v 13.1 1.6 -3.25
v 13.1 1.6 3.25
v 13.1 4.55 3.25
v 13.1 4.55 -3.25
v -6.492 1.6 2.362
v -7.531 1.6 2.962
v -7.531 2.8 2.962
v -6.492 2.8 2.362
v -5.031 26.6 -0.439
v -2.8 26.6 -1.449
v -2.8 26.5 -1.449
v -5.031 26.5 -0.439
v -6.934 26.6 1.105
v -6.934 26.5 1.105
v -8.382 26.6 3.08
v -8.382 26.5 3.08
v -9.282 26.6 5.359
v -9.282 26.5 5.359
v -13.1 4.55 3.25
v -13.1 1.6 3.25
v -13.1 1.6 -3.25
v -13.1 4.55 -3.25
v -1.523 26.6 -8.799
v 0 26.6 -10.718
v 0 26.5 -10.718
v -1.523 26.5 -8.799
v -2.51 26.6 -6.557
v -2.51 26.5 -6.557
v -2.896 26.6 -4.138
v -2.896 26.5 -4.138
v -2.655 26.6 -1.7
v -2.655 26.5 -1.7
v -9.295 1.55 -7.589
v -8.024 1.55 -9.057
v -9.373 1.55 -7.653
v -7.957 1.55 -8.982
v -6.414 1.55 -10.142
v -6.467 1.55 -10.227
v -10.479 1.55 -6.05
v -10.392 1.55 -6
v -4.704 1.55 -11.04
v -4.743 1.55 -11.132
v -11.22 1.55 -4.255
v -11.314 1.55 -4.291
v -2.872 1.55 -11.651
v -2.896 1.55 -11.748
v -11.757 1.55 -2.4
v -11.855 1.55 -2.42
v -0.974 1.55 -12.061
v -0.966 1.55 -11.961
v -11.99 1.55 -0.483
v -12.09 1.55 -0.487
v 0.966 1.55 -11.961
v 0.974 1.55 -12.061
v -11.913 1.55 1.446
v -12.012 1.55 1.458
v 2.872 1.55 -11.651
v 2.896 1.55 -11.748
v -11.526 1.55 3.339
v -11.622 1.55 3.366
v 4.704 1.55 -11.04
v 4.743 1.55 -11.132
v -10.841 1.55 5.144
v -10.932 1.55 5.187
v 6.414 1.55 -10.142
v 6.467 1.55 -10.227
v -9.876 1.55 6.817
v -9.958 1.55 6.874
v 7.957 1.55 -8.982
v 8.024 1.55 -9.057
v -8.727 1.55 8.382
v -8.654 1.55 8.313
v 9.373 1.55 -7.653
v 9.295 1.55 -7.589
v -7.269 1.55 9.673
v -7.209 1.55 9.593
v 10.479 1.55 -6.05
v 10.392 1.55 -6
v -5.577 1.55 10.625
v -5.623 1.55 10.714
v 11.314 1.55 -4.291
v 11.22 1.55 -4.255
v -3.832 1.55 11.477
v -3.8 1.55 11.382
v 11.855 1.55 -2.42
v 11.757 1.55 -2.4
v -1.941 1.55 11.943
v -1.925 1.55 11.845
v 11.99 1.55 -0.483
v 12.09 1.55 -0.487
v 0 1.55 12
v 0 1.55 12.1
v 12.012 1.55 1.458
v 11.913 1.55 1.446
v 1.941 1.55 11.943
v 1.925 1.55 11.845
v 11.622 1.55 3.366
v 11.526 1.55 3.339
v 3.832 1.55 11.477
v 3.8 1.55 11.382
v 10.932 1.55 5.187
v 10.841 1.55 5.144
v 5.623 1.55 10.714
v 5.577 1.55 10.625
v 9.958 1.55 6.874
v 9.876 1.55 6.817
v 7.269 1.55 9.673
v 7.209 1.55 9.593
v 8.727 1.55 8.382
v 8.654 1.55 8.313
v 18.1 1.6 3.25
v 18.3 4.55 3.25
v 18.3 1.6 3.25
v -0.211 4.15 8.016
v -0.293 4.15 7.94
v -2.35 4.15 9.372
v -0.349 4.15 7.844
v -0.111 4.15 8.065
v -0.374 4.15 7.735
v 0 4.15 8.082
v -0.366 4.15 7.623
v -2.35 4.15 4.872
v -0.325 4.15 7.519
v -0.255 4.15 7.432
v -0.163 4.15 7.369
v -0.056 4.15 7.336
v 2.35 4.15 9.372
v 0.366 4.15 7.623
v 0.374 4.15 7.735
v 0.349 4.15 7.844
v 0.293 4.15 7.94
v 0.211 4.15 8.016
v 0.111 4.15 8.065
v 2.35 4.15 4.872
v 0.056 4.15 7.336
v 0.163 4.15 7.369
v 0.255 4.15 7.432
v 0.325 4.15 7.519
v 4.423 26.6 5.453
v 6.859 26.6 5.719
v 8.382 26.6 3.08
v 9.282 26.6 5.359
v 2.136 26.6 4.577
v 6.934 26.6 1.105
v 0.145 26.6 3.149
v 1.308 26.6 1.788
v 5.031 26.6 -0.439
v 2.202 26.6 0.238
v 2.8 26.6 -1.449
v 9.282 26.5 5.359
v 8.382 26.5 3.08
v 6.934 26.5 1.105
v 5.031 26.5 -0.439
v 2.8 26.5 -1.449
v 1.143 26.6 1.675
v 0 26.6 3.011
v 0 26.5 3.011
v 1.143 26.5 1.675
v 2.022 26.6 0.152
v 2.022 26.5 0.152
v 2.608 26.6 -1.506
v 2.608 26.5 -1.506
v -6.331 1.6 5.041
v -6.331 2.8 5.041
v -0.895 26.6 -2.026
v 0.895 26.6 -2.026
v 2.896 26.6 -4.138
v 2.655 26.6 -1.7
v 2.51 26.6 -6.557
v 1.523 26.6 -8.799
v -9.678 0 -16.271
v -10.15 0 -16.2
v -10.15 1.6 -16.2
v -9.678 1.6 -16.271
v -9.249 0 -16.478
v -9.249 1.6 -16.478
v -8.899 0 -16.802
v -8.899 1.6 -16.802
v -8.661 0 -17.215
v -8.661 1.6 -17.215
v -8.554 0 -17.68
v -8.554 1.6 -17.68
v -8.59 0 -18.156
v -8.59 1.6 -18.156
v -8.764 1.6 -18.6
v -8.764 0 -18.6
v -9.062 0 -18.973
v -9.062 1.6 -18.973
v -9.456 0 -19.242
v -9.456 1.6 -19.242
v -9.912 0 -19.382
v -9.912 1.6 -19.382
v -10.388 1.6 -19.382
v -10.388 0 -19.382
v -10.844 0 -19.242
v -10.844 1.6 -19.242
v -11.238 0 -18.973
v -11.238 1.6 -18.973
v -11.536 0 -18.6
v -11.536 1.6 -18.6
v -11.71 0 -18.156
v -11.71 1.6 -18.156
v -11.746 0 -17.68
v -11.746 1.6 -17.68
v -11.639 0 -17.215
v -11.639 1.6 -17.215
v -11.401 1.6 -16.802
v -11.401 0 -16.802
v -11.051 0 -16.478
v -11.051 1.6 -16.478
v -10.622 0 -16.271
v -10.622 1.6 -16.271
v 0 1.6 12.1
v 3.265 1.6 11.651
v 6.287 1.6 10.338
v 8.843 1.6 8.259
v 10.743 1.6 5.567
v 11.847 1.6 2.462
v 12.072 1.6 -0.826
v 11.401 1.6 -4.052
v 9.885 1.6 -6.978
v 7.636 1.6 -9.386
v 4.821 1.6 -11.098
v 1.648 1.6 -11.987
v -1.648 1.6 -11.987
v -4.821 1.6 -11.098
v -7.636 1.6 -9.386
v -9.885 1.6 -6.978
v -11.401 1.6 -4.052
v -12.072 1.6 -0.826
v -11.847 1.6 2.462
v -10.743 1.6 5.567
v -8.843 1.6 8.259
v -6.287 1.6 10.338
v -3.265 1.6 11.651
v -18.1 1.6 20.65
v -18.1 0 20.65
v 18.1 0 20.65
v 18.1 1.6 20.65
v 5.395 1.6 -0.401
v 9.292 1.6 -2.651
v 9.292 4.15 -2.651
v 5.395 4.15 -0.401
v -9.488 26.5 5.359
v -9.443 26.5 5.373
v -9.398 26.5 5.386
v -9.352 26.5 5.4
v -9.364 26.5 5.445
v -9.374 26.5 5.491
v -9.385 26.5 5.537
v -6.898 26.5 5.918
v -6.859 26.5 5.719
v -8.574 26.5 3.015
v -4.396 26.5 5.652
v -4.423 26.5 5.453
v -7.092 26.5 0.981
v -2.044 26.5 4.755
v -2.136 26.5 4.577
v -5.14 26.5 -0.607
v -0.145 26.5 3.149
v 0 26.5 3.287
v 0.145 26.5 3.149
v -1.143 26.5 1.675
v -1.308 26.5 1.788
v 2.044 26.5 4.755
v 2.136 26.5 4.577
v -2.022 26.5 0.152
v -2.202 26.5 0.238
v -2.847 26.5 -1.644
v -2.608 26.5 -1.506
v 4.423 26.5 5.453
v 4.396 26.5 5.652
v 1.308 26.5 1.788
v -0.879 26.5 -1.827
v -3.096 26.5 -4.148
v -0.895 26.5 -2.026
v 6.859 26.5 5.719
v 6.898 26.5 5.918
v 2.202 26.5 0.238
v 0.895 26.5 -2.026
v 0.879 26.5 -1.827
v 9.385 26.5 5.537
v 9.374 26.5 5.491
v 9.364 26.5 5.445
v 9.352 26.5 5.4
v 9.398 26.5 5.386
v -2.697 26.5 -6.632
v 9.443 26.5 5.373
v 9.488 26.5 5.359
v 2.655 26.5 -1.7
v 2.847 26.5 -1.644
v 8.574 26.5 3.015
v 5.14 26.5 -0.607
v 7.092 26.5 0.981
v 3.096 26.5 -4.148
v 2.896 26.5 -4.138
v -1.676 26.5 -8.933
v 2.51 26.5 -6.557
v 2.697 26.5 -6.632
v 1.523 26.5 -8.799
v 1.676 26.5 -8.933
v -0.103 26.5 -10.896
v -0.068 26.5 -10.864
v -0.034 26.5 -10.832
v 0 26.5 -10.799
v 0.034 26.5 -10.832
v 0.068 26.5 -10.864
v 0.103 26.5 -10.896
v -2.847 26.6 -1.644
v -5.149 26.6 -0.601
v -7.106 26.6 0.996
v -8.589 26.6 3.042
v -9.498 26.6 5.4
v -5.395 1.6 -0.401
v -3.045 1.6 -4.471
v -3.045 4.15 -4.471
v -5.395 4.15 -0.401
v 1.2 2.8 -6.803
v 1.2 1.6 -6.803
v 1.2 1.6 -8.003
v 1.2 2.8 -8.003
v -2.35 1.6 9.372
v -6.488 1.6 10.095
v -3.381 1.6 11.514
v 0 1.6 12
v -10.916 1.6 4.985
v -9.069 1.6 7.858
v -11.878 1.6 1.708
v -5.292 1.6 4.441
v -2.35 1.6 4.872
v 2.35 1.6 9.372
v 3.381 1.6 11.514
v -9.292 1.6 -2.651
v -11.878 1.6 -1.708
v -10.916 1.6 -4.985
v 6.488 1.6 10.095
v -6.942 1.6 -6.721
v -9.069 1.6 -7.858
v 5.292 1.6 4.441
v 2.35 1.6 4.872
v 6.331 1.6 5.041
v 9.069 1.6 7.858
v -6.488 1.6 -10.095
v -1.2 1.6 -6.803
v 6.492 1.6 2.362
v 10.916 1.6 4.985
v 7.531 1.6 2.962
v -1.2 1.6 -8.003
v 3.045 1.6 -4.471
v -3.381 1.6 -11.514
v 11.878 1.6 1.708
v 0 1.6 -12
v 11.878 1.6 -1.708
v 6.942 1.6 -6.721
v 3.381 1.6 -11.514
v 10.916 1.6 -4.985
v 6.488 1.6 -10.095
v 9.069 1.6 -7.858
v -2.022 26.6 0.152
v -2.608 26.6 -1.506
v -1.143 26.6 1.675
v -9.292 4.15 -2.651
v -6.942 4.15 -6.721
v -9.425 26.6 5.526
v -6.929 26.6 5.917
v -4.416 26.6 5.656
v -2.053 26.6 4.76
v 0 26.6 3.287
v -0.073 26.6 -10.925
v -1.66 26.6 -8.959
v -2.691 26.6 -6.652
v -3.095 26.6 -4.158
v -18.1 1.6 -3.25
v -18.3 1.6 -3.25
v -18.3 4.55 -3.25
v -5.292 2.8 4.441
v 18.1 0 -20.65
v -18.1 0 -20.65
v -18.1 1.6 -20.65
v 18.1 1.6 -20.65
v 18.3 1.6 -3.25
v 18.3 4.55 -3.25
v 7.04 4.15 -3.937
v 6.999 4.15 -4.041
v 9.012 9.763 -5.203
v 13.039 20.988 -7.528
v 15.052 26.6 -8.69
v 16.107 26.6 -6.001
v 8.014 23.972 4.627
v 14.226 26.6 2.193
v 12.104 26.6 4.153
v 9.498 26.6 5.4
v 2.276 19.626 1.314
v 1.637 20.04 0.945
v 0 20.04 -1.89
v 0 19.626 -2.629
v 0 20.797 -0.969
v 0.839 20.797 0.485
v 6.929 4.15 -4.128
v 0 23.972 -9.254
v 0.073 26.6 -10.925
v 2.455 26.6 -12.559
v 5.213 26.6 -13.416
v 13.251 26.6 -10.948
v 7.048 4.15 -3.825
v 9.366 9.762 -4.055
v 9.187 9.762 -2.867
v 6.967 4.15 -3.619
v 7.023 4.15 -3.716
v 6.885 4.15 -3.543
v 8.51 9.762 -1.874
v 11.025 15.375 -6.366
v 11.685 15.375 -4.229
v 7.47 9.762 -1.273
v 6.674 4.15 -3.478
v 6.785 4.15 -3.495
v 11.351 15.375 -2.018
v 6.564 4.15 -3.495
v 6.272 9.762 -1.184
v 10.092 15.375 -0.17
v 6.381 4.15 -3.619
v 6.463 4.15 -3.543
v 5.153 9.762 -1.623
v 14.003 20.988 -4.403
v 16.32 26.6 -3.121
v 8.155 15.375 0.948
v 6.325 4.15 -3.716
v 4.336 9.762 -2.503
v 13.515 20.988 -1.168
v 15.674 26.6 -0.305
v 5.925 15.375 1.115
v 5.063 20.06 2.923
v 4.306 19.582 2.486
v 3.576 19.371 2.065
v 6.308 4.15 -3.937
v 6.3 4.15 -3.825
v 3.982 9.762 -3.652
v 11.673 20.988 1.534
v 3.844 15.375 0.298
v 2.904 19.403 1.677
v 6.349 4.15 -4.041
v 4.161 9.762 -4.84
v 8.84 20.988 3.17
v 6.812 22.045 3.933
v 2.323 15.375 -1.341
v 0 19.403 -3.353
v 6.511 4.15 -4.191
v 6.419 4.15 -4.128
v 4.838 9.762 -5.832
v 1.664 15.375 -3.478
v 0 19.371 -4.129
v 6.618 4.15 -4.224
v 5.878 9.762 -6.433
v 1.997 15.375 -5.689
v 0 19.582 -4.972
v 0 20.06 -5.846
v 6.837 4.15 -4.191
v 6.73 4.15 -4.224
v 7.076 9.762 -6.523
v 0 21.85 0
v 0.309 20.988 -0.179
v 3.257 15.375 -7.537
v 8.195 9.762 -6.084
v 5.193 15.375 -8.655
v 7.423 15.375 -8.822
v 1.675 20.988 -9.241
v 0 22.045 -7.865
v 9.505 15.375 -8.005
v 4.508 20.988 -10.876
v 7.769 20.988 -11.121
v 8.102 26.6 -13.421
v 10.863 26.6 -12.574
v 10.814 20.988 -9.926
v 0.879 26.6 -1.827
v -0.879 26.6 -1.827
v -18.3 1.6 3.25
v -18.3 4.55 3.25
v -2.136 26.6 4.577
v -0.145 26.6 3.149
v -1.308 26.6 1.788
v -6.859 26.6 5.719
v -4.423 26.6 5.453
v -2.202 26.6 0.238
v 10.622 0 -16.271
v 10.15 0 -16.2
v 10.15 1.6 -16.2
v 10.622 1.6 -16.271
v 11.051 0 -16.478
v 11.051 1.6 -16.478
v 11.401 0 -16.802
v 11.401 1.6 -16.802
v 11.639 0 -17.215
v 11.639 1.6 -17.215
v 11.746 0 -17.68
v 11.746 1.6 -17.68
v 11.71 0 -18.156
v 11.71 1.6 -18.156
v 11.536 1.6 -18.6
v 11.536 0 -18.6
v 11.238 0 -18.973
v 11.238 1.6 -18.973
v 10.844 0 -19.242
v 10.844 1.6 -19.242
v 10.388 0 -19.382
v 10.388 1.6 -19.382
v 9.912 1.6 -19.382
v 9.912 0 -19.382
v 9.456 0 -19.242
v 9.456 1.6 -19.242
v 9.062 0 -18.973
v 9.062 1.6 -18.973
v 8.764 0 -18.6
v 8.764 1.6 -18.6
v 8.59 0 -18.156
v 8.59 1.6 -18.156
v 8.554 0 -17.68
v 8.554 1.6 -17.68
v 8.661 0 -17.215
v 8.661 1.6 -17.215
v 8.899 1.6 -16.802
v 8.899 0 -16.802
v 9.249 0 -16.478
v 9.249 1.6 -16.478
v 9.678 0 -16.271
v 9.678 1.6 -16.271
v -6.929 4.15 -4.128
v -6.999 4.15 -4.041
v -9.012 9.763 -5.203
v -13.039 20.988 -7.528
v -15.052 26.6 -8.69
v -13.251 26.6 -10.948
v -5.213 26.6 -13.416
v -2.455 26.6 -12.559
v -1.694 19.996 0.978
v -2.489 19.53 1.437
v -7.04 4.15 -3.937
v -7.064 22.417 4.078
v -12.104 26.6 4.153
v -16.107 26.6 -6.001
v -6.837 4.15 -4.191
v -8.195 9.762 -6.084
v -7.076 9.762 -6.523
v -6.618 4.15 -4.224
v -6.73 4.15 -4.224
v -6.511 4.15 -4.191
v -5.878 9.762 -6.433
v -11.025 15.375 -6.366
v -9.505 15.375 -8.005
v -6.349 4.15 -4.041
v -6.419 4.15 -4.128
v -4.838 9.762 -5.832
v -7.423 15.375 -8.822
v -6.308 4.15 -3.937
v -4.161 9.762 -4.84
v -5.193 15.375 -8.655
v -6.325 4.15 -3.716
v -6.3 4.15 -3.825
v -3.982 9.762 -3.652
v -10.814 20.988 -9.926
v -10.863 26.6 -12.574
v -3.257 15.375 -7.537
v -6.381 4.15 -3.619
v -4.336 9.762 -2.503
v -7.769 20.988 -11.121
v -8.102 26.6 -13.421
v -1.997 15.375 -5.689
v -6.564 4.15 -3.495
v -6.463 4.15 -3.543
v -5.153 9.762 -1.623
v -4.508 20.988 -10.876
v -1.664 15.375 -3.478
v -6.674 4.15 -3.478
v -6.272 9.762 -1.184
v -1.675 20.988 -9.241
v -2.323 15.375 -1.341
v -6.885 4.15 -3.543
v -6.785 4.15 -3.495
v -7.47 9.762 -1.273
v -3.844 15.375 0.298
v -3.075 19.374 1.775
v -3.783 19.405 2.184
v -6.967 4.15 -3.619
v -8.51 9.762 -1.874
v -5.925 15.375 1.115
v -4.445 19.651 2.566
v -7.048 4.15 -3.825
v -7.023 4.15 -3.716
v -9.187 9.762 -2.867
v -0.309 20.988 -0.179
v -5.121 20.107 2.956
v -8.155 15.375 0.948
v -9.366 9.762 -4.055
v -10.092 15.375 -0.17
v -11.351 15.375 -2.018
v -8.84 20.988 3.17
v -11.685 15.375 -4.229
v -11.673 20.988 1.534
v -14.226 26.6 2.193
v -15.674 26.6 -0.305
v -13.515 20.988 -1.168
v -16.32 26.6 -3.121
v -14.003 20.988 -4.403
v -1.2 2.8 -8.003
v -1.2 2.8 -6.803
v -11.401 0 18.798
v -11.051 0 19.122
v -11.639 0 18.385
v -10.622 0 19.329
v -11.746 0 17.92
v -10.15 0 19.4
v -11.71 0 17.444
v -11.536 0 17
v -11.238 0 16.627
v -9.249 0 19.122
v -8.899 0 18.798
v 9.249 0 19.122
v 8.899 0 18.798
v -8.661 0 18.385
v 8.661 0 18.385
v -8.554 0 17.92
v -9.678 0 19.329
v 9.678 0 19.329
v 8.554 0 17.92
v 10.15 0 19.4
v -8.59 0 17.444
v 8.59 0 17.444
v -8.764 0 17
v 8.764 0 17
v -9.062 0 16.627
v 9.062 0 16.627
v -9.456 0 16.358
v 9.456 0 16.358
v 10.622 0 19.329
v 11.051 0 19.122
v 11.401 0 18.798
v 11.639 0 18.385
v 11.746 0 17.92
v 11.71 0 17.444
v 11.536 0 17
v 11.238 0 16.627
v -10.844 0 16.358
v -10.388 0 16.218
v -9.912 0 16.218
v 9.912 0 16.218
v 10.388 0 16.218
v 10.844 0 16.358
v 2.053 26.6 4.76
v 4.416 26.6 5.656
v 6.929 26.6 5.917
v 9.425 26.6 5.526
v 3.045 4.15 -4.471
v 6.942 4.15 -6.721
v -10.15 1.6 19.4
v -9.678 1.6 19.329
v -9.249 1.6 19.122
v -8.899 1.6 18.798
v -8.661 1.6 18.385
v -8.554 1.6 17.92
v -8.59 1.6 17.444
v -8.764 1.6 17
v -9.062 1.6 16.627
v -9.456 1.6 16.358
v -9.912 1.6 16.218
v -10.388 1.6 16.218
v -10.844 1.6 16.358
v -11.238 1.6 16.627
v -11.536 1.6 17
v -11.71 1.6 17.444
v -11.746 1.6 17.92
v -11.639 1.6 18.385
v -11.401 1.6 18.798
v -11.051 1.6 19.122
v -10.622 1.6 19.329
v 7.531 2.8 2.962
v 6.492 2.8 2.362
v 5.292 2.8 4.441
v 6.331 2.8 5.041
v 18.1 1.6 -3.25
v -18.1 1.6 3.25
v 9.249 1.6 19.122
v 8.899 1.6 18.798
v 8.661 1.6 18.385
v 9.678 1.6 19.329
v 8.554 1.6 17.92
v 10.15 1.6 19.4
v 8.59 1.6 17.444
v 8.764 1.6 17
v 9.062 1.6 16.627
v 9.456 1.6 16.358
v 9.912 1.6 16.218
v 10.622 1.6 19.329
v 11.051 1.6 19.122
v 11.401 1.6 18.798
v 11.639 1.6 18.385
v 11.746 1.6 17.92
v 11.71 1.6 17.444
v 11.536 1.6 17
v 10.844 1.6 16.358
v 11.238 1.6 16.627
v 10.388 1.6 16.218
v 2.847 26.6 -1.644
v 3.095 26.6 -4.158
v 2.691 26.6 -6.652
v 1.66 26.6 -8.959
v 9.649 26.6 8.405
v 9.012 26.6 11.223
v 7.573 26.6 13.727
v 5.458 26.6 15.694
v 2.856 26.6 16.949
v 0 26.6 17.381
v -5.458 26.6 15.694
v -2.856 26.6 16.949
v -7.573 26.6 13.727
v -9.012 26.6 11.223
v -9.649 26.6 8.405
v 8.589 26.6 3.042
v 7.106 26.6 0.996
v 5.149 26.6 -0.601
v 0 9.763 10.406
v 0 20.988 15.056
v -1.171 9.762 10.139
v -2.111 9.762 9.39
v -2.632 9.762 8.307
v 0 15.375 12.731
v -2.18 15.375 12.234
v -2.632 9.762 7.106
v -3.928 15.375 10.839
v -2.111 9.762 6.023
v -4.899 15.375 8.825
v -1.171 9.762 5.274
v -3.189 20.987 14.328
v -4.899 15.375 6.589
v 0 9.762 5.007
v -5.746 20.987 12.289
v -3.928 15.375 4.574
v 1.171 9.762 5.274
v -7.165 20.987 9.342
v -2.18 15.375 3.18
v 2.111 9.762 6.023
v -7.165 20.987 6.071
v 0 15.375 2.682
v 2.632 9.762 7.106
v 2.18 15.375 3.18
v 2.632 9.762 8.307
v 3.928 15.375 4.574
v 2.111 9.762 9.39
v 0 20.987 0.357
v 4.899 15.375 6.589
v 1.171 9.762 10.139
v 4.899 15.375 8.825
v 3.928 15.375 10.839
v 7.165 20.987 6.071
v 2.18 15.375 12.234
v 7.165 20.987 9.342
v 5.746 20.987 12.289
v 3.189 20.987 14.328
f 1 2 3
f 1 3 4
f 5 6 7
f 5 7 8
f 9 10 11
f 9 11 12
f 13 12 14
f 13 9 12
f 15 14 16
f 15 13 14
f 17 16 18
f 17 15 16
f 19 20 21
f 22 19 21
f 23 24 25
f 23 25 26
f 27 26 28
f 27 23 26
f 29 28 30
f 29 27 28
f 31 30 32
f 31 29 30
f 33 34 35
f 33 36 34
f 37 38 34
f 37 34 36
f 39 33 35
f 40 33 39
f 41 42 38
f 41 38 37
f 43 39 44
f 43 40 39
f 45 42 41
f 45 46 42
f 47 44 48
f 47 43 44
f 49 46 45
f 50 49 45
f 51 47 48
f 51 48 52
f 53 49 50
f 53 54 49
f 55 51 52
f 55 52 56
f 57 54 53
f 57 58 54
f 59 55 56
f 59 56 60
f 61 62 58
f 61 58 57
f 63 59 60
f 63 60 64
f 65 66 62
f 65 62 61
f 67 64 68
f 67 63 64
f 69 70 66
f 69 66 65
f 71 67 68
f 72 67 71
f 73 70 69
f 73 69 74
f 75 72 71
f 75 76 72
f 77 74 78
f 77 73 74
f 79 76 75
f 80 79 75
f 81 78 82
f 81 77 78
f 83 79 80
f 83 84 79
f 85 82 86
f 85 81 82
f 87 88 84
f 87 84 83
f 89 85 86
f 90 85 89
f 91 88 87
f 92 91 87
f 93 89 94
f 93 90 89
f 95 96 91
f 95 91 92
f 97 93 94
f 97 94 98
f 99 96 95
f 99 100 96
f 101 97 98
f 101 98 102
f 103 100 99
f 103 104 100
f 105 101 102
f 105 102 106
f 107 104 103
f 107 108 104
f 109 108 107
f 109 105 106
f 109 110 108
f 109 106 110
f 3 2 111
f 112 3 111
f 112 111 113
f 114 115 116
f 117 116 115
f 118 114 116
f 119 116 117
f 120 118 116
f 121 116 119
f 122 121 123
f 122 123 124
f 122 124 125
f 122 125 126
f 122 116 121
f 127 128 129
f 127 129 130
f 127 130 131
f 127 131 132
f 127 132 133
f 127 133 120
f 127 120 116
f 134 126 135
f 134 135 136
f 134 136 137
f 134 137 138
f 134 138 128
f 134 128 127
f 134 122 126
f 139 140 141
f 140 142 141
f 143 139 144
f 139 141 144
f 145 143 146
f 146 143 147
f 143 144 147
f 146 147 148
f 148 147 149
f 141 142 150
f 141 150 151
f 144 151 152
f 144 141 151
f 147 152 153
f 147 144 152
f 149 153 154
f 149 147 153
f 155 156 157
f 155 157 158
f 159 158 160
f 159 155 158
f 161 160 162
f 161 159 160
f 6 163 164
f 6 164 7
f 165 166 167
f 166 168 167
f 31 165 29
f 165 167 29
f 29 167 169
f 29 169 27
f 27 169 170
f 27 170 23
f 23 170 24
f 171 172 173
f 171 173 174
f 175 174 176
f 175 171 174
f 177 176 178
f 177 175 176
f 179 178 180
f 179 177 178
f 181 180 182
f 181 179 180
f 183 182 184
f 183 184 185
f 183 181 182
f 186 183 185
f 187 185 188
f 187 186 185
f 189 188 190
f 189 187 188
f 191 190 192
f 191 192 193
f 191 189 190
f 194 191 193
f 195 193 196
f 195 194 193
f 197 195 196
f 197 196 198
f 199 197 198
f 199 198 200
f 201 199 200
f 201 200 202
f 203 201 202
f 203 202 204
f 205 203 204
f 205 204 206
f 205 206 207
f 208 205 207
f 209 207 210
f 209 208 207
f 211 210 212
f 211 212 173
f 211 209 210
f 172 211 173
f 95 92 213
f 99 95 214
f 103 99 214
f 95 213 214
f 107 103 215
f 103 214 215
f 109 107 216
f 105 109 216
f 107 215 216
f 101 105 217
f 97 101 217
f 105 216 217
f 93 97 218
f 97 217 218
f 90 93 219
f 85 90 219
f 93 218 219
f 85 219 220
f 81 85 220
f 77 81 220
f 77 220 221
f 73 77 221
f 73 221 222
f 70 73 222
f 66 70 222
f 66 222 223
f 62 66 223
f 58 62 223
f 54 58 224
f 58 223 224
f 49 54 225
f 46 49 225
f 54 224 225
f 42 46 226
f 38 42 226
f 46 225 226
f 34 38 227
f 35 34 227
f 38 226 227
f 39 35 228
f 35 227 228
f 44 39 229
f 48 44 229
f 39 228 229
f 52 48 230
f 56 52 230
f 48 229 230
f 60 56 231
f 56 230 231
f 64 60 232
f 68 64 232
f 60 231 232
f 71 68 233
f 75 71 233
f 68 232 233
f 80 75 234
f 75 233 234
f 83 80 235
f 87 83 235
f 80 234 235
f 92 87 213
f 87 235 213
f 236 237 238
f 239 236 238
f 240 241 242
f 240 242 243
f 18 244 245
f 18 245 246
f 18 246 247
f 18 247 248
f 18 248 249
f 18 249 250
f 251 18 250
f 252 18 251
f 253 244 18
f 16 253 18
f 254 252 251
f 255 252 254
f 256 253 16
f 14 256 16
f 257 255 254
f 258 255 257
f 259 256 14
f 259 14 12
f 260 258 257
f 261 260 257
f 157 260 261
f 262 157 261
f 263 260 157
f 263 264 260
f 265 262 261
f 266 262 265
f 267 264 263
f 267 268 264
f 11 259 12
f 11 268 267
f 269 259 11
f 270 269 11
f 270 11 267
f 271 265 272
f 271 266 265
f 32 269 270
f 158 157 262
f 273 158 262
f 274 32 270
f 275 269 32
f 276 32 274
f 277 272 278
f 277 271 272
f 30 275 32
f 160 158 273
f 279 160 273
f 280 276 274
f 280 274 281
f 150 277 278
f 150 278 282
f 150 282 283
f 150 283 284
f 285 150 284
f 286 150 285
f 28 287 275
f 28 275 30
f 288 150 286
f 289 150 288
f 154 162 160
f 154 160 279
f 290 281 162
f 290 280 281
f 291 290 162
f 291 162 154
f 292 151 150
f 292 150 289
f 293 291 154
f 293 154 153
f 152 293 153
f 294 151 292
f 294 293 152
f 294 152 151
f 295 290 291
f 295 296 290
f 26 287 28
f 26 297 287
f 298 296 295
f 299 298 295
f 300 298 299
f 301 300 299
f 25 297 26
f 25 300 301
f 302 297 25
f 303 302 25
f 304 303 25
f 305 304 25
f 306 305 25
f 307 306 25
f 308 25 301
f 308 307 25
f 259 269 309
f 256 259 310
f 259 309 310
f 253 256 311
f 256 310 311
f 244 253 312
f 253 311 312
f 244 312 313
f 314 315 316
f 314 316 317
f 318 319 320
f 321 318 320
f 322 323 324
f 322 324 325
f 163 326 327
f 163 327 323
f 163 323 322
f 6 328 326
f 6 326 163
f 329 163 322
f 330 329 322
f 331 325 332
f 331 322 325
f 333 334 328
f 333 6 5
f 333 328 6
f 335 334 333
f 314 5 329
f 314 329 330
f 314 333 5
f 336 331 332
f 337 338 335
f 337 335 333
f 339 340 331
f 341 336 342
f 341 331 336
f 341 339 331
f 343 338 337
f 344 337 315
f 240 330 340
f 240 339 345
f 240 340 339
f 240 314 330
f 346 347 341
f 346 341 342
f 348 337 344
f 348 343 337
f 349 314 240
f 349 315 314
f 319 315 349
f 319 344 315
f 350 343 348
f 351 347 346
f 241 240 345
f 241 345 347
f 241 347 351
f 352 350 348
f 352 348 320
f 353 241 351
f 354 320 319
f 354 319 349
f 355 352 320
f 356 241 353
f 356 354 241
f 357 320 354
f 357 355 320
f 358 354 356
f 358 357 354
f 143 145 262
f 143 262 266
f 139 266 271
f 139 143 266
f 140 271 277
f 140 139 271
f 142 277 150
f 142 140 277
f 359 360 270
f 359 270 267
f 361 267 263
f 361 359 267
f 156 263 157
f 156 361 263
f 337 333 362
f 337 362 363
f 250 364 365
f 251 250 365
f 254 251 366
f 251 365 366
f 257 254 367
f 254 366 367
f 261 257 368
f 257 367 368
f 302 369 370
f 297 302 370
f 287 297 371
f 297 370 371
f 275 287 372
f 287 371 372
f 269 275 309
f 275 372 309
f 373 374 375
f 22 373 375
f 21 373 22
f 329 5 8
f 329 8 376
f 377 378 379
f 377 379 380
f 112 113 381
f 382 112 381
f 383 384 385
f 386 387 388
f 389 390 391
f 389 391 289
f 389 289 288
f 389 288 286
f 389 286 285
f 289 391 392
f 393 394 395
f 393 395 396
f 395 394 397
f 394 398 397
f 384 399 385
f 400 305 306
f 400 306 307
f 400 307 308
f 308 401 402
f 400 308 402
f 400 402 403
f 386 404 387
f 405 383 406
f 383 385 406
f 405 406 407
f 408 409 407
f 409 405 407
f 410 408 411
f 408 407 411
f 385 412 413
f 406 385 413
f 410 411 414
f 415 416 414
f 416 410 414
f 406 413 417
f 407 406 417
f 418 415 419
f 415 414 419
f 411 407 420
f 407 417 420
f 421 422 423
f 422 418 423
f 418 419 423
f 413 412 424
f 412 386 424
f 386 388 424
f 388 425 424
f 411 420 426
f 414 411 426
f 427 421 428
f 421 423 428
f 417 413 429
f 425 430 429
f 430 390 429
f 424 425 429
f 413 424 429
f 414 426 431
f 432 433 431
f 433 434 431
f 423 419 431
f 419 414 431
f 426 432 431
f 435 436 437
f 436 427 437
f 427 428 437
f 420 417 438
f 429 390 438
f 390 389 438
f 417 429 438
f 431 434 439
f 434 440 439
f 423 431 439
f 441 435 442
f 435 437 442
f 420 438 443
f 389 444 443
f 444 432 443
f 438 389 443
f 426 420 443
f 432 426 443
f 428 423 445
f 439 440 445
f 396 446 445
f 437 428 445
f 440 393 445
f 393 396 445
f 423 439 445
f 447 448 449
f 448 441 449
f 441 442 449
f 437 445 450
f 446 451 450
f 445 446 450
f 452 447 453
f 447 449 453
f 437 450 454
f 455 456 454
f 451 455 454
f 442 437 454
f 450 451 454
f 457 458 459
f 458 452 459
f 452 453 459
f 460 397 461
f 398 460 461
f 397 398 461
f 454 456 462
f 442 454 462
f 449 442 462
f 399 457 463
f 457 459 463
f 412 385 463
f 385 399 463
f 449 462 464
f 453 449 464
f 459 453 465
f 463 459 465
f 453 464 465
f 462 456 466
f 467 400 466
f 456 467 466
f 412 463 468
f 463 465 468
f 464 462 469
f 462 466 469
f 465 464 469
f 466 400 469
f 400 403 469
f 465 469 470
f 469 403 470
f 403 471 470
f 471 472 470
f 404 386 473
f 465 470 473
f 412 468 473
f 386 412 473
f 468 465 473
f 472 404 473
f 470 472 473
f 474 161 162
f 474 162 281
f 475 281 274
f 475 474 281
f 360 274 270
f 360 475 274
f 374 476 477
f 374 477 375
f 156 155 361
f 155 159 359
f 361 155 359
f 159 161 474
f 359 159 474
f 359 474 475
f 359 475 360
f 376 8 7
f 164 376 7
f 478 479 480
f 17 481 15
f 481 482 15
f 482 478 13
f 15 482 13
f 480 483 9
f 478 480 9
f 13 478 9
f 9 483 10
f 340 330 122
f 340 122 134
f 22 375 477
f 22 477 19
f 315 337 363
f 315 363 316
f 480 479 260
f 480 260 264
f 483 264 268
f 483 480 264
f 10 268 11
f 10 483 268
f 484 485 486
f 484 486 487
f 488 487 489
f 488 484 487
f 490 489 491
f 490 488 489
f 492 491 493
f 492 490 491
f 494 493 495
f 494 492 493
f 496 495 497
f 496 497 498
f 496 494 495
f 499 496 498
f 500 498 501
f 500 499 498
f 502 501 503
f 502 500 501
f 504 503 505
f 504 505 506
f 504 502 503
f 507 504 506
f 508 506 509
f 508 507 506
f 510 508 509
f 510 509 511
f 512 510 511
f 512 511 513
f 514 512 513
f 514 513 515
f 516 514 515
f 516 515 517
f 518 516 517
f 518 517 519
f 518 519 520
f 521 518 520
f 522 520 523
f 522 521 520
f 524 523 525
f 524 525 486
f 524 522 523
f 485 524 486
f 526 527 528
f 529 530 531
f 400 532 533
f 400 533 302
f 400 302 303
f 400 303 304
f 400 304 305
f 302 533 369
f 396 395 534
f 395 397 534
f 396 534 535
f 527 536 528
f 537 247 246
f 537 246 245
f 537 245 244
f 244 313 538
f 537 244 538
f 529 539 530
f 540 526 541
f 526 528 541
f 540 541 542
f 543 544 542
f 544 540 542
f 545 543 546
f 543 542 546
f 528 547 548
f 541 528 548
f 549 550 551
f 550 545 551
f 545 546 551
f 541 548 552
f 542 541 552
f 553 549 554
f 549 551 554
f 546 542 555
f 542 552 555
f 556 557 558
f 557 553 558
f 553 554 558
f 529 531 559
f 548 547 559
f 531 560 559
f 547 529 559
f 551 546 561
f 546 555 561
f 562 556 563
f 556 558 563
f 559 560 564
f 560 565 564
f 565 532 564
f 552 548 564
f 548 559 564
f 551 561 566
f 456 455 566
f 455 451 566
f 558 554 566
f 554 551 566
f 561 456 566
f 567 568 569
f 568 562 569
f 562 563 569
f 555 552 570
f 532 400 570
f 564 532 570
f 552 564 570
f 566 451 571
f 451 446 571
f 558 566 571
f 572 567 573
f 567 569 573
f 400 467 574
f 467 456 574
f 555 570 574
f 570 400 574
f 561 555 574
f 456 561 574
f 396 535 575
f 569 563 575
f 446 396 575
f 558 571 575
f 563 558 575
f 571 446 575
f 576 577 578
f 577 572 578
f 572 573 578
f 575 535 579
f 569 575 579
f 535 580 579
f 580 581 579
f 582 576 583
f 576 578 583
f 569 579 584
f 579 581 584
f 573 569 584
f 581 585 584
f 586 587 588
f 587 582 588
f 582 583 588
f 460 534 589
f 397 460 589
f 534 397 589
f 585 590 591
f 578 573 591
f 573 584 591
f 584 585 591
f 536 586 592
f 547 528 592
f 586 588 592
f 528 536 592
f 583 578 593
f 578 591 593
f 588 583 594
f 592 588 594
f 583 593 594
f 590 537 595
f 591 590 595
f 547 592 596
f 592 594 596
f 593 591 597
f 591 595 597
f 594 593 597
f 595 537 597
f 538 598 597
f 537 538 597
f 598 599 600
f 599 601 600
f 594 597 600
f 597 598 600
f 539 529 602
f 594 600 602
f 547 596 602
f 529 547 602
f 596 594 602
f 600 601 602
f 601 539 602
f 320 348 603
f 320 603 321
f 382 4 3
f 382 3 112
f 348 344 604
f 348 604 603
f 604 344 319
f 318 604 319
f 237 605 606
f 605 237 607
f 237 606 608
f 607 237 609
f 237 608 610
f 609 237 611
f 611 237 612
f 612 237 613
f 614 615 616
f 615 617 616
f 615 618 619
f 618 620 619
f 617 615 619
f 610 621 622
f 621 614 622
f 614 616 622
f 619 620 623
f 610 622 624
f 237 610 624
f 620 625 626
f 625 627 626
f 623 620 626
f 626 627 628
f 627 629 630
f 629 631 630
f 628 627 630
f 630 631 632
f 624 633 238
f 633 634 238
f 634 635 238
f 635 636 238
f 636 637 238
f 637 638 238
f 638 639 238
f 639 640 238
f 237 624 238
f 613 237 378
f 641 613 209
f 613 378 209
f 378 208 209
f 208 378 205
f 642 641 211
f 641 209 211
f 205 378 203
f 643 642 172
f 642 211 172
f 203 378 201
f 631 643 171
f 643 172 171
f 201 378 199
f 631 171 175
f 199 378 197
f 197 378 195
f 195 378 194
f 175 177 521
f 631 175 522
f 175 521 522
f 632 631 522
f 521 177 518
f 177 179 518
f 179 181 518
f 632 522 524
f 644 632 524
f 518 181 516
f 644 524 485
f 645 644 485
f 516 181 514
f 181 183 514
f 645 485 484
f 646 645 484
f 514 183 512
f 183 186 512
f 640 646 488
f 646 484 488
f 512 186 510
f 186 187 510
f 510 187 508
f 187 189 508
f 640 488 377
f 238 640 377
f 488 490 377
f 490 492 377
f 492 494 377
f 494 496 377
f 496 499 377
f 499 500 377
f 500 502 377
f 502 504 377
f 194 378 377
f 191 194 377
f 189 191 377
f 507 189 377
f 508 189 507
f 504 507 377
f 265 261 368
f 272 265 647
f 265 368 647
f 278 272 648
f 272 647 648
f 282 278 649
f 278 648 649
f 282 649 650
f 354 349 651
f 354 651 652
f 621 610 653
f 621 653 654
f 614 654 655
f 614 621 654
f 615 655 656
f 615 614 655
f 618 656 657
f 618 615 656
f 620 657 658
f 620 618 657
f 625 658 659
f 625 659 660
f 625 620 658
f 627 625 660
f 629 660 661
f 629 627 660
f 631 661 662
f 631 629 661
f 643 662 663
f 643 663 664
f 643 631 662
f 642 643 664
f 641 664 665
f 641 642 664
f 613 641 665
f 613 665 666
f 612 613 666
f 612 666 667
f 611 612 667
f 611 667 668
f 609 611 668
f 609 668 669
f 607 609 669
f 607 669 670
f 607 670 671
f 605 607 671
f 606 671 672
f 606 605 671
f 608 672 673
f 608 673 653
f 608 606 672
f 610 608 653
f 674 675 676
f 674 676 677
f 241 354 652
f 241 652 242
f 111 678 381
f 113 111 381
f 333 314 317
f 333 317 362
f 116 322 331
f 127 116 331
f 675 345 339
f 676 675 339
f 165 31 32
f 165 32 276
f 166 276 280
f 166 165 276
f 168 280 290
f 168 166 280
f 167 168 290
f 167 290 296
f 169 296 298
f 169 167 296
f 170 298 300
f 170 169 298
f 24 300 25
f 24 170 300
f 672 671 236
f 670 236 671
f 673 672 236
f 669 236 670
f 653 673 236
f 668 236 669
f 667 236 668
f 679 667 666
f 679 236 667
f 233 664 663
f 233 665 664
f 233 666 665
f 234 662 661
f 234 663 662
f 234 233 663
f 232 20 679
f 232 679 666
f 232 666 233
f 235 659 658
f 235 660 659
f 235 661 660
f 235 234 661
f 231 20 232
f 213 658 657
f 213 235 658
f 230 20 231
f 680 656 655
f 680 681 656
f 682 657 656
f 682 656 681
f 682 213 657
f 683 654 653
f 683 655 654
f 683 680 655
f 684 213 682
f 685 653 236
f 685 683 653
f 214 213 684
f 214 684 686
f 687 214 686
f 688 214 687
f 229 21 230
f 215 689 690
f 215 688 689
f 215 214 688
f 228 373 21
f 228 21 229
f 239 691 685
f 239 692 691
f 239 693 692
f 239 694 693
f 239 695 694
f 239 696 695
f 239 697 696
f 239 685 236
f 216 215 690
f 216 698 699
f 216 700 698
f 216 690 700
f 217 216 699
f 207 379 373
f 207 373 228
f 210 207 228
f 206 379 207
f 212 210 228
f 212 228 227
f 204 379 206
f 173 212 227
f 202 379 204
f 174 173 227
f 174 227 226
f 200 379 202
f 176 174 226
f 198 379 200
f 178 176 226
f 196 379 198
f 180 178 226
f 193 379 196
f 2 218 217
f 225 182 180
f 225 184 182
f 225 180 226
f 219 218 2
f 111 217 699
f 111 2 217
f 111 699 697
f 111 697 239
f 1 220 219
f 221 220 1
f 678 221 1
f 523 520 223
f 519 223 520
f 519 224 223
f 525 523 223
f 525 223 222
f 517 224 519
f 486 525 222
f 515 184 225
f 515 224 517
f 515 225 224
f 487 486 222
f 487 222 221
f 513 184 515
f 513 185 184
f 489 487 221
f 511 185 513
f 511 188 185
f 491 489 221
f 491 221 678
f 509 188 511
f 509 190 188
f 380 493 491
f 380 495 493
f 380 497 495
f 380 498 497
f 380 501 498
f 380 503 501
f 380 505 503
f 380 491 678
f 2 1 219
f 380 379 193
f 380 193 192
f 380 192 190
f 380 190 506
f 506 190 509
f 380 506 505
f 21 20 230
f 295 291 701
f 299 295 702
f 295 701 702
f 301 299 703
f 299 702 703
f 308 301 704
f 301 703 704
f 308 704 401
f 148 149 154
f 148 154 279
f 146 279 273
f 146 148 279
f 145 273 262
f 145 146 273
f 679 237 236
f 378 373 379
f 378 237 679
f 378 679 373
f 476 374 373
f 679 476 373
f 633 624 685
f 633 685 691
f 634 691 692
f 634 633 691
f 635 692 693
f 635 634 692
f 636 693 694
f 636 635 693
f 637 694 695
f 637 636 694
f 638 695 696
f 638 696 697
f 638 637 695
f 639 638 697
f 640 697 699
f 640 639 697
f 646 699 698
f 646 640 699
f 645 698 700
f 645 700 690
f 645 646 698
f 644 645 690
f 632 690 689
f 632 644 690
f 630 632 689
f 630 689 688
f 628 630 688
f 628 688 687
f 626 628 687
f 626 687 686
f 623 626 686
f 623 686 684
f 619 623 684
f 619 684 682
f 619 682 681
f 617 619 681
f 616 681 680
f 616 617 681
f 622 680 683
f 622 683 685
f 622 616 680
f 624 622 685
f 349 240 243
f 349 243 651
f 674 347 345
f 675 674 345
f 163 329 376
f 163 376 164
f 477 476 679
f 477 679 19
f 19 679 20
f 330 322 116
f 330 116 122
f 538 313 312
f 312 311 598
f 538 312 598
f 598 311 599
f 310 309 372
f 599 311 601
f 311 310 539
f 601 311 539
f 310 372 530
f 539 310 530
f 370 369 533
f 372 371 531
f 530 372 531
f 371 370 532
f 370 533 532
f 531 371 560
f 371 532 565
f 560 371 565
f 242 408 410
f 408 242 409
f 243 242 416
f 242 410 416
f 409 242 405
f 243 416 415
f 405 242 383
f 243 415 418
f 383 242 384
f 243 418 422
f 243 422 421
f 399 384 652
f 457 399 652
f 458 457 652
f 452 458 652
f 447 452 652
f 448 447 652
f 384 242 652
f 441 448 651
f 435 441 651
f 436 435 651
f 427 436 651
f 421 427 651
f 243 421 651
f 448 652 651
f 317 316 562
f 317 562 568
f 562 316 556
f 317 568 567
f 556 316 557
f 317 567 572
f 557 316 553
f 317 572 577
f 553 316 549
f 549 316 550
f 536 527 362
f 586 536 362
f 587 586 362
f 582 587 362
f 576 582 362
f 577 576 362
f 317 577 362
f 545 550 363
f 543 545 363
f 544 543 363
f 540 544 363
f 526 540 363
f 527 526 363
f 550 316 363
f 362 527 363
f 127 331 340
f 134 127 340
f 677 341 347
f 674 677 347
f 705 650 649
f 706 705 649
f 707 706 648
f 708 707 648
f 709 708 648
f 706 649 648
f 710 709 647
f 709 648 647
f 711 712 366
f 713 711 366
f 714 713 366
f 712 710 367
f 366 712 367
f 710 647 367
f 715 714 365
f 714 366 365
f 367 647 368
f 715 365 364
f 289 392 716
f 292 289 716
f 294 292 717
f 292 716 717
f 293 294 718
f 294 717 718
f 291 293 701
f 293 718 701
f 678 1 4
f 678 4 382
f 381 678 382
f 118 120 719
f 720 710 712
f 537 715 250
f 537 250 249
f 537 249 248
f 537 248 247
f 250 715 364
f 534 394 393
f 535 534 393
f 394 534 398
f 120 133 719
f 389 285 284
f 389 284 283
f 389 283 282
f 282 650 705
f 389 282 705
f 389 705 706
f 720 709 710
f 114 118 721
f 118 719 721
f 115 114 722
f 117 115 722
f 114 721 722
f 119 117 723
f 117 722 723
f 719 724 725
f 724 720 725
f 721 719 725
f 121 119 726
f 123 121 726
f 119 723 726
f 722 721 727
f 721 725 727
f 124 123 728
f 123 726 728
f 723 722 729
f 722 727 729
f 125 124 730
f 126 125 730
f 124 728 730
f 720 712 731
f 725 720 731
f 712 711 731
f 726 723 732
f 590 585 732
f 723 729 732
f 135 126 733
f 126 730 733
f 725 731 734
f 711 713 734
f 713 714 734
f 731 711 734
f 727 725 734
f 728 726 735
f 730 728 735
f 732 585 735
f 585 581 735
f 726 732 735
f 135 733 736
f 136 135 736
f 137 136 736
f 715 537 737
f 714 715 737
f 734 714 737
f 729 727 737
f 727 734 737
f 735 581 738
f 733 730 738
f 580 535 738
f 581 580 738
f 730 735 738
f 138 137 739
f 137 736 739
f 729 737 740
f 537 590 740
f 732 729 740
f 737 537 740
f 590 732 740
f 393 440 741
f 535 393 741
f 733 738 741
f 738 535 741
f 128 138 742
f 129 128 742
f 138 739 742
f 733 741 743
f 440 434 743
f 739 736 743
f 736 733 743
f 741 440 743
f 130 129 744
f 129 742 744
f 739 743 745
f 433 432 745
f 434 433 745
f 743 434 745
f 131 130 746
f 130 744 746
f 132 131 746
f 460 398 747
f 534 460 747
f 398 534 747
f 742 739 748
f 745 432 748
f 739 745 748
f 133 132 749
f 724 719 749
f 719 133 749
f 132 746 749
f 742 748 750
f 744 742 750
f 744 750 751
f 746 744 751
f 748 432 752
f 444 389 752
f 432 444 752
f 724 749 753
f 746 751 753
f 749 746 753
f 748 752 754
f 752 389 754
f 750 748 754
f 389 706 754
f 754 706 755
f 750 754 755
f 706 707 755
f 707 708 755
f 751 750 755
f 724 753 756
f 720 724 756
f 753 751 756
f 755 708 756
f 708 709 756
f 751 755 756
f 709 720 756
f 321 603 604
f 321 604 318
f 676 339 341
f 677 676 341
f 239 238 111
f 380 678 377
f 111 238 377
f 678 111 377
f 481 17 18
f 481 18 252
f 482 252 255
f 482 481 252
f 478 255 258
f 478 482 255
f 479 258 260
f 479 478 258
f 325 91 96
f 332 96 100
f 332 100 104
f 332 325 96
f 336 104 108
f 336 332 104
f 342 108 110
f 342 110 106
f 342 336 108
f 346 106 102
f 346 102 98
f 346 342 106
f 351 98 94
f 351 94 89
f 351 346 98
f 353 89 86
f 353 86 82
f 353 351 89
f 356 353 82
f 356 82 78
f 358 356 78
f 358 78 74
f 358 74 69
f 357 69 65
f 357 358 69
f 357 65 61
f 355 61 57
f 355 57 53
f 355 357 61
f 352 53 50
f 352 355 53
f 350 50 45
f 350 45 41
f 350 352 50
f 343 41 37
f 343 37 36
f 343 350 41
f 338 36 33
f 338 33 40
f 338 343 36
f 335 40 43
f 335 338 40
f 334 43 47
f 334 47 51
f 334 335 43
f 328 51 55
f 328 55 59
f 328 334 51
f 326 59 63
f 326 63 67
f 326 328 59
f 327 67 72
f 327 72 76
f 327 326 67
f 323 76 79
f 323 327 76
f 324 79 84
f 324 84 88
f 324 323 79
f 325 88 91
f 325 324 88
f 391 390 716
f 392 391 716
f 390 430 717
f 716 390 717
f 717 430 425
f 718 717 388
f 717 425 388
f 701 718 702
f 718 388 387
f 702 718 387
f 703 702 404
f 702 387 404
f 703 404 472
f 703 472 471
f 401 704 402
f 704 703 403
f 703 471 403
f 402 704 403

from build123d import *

# Parameters (mm, degrees)
SKETCH1_W           = 36.2
SKETCH1_H           = 41.3
SKETCH1_R           = 1.6
BOSS_EXTRUDE1_DEPTH = 1.6
SKETCH2_W           = 5.2
SKETCH2_H           = 6.5
BOSS_EXTRUDE2_DEPTH = 2.95
SKETCH3_W           = 4.7
SKETCH3_H           = 4.5
BOSS_EXTRUDE3_DEPTH = 2.55
SKETCH4_W           = 2.4
SKETCH4_H           = 1.2
BOSS_EXTRUDE4_DEPTH = 1.2
SKETCH5_R           = 12.1
SKETCH5_R_2         = 12
CUT_EXTRUDE1_DEPTH  = 0.05
SKETCH6_R           = 0.375
CUT_EXTRUDE2_DEPTH  = 28.825752461
CIRPATTERN2_COUNT   = 3
CUT_EXTRUDE3_DEPTH  = 0.1


with BuildPart() as part:
    # Sketch1 → Boss-Extrude1 (new body)
    with BuildSketch(Plane(origin=(0, 0, 0), x_dir=(1, 0, 0), z_dir=(0, 1, 0))):
        Rectangle(SKETCH1_W, SKETCH1_H)
        with Locations(Location((-10.15, 17.8, 0), (0, 0, 270))):
            Circle(SKETCH1_R, mode=Mode.SUBTRACT)
        with Locations(Location((10.15, 17.8, 0), (0, 0, 270))):
            Circle(SKETCH1_R, mode=Mode.SUBTRACT)
        with Locations(Location((-10.15, -17.8, 0), (0, 0, 270))):
            Circle(SKETCH1_R, mode=Mode.SUBTRACT)
        with Locations(Location((10.15, -17.8, 0), (0, 0, 270))):
            Circle(SKETCH1_R, mode=Mode.SUBTRACT)
    extrude(amount=BOSS_EXTRUDE1_DEPTH)

    # Sketch2 → Boss-Extrude2 (add)
    with BuildSketch(Plane(origin=(0, 1.6, 0), x_dir=(1, 0, 0), z_dir=(0, 1, 0))):
        with Locations((-15.7, 0)):
            Rectangle(SKETCH2_W, SKETCH2_H)
        with Locations((15.7, 0)):
            Rectangle(SKETCH2_W, SKETCH2_H)
    extrude(amount=BOSS_EXTRUDE2_DEPTH)

    # Sketch3 → Boss-Extrude3 (add)
    with BuildSketch(Plane(origin=(0, 1.6, 0), x_dir=(1, 0, 0), z_dir=(0, 1, 0))):
        Polygon((-6.941670728, 6.721321728), (-3.04455641, 4.471321728), (-5.39455641, 0.401002331), (-9.291670728, 2.651002331), align=None)
        Polygon((3.04455641, 4.471321728), (6.941670728, 6.721321728), (9.291670728, 2.651002331), (5.39455641, 0.401002331), align=None)
        with Locations((0, -7.122324059)):
            Rectangle(SKETCH3_W, SKETCH3_H)
    extrude(amount=BOSS_EXTRUDE3_DEPTH)

    # Sketch4 → Boss-Extrude4 (add)
    with BuildSketch(Plane(origin=(0, 1.6, 0), x_dir=(1, 0, 0), z_dir=(0, 1, 0))):
        with Locations((0, 7.403377608)):
            Rectangle(SKETCH4_W, SKETCH4_H)
        Polygon((6.49189784, -2.362458319), (5.29189784, -4.440919288), (6.331128324, -5.040919288), (7.531128324, -2.962458319), align=None)
        Polygon((-6.49189784, -2.362458319), (-5.29189784, -4.440919288), (-6.331128324, -5.040919288), (-7.531128324, -2.962458319), align=None)
    extrude(amount=BOSS_EXTRUDE4_DEPTH)

    # Sketch5 → Cut-Extrude1 (cut)
    with BuildSketch(Plane(origin=(0, 1.6, 0), x_dir=(1, 0, 0), z_dir=(0, 1, 0))):
        with Locations(Location((0, 0, 0), (0, 0, 270))):
            Circle(SKETCH5_R)
        with Locations(Location((0, 0, 0), (0, 0, 270))):
            Circle(SKETCH5_R_2, mode=Mode.SUBTRACT)
    extrude(amount=-CUT_EXTRUDE1_DEPTH, mode=Mode.SUBTRACT)

    # Sketch6 → Cut-Extrude2 (cut, through all)
    with BuildSketch(Plane(origin=(0, 3.6, 0), x_dir=(1, 0, 0), z_dir=(0, 1, 0))):
        with Locations(Location((-6.674097159, 3.853291792, 0), (0, 0, 270))):
            Circle(SKETCH6_R)
        with Locations(Location((6.674097159, 3.853291792, 0), (0, 0, 270))):
            Circle(SKETCH6_R)
        with Locations(Location((0, -7.706583583, 0), (0, 0, 270))):
            Circle(SKETCH6_R)
    extrude(amount=CUT_EXTRUDE2_DEPTH, mode=Mode.SUBTRACT)

    # Sketch7 → Revolve3 (revolve)
    with BuildSketch(Plane(origin=(0, 0, 0), x_dir=(0, 0, -1), z_dir=(1, 0, 0)), mode=Mode.PRIVATE) as revolve3_sk:
        Polygon((1.967510892, 26.6), (-7.706583583, 26.6), (-7.706583583, 3.6), (-7.331583583, 3.6), (-7.331583583, 4.15), align=None)
    revolve3 = revolve(revolve3_sk.sketch.rotate(Axis((0, 26.6, 7.706583583), (0, -1, 0)), 180), axis=Axis((0, 26.6, 7.706583583), (0, -1, 0)))

    # CirPattern2: Revolve3 ×3 about axis
    cirpattern2_axis = Axis((0, 0, 0), (0, 1, 0))
    for i in range(1, CIRPATTERN2_COUNT):
        add(revolve3.rotate(cirpattern2_axis, i * 360 / CIRPATTERN2_COUNT))

    # Sketch8 → Cut-Extrude3 (cut)
    with BuildSketch(Plane(origin=(0, 26.6, 0), x_dir=(1, 0, 0), z_dir=(0, 1, 0))):
        with BuildLine():
            Line((-9.49791005, -5.399501553), (-9.425060538, -5.52568061))
            ThreePointArc((-9.425060538, -5.52568061), (-4.415728318, -5.656318768), (0, -3.287390943))
            ThreePointArc((0, -3.287390943), (4.415728318, -5.656318768), (9.425060538, -5.52568061))
            Line((9.425060538, -5.52568061), (9.49791005, -5.399501553))
            ThreePointArc((9.49791005, -5.399501553), (7.106379904, -0.995973516), (2.846964069, 1.643695472))
            ThreePointArc((2.846964069, 1.643695472), (2.690651586, 6.652292283), (0.072849512, 10.925182163))
            Line((0.072849512, 10.925182163), (-0.072849512, 10.925182163))
            ThreePointArc((-0.072849512, 10.925182163), (-2.690651586, 6.652292283), (-2.846964069, 1.643695472))
            ThreePointArc((-2.846964069, 1.643695472), (-7.106379904, -0.995973516), (-9.49791005, -5.399501553))
        make_face()
        with BuildLine():
            ThreePointArc((0, -3.011088161), (1.617311874, -0.933755446), (2.60767884, 1.50554408))
            ThreePointArc((2.60767884, 1.50554408), (0, 1.867510892), (-2.60767884, 1.50554408))
            ThreePointArc((-2.60767884, 1.50554408), (-1.617311874, -0.933755446), (0, -3.011088161))
        make_face(mode=Mode.SUBTRACT)
        with BuildLine():
            ThreePointArc((0, 10.717671744), (-2.510270593, 6.557117602), (-2.654727509, 1.700081323))
            ThreePointArc((-2.654727509, 1.700081323), (0, 2.067510892), (2.654727509, 1.700081323))
            ThreePointArc((2.654727509, 1.700081323), (2.510270593, 6.557117602), (0, 10.717671744))
        make_face(mode=Mode.SUBTRACT)
        with BuildLine():
            ThreePointArc((-9.281776, -5.358835872), (-4.423495123, -5.452516905), (-0.14494986, -3.149102125))
            ThreePointArc((-0.14494986, -3.149102125), (-1.790516955, -1.033755446), (-2.799677369, 1.449020802))
            ThreePointArc((-2.799677369, 1.449020802), (-6.933765715, -1.104600697), (-9.281776, -5.358835872))
        make_face(mode=Mode.SUBTRACT)
        with BuildLine():
            ThreePointArc((9.281776, -5.358835872), (6.933765715, -1.104600697), (2.799677369, 1.449020802))
            ThreePointArc((2.799677369, 1.449020802), (1.790516955, -1.033755446), (0.14494986, -3.149102125))
            ThreePointArc((0.14494986, -3.149102125), (4.423495123, -5.452516905), (9.281776, -5.358835872))
        make_face(mode=Mode.SUBTRACT)
    extrude(amount=-CUT_EXTRUDE3_DEPTH, mode=Mode.SUBTRACT)


solid = part.part
